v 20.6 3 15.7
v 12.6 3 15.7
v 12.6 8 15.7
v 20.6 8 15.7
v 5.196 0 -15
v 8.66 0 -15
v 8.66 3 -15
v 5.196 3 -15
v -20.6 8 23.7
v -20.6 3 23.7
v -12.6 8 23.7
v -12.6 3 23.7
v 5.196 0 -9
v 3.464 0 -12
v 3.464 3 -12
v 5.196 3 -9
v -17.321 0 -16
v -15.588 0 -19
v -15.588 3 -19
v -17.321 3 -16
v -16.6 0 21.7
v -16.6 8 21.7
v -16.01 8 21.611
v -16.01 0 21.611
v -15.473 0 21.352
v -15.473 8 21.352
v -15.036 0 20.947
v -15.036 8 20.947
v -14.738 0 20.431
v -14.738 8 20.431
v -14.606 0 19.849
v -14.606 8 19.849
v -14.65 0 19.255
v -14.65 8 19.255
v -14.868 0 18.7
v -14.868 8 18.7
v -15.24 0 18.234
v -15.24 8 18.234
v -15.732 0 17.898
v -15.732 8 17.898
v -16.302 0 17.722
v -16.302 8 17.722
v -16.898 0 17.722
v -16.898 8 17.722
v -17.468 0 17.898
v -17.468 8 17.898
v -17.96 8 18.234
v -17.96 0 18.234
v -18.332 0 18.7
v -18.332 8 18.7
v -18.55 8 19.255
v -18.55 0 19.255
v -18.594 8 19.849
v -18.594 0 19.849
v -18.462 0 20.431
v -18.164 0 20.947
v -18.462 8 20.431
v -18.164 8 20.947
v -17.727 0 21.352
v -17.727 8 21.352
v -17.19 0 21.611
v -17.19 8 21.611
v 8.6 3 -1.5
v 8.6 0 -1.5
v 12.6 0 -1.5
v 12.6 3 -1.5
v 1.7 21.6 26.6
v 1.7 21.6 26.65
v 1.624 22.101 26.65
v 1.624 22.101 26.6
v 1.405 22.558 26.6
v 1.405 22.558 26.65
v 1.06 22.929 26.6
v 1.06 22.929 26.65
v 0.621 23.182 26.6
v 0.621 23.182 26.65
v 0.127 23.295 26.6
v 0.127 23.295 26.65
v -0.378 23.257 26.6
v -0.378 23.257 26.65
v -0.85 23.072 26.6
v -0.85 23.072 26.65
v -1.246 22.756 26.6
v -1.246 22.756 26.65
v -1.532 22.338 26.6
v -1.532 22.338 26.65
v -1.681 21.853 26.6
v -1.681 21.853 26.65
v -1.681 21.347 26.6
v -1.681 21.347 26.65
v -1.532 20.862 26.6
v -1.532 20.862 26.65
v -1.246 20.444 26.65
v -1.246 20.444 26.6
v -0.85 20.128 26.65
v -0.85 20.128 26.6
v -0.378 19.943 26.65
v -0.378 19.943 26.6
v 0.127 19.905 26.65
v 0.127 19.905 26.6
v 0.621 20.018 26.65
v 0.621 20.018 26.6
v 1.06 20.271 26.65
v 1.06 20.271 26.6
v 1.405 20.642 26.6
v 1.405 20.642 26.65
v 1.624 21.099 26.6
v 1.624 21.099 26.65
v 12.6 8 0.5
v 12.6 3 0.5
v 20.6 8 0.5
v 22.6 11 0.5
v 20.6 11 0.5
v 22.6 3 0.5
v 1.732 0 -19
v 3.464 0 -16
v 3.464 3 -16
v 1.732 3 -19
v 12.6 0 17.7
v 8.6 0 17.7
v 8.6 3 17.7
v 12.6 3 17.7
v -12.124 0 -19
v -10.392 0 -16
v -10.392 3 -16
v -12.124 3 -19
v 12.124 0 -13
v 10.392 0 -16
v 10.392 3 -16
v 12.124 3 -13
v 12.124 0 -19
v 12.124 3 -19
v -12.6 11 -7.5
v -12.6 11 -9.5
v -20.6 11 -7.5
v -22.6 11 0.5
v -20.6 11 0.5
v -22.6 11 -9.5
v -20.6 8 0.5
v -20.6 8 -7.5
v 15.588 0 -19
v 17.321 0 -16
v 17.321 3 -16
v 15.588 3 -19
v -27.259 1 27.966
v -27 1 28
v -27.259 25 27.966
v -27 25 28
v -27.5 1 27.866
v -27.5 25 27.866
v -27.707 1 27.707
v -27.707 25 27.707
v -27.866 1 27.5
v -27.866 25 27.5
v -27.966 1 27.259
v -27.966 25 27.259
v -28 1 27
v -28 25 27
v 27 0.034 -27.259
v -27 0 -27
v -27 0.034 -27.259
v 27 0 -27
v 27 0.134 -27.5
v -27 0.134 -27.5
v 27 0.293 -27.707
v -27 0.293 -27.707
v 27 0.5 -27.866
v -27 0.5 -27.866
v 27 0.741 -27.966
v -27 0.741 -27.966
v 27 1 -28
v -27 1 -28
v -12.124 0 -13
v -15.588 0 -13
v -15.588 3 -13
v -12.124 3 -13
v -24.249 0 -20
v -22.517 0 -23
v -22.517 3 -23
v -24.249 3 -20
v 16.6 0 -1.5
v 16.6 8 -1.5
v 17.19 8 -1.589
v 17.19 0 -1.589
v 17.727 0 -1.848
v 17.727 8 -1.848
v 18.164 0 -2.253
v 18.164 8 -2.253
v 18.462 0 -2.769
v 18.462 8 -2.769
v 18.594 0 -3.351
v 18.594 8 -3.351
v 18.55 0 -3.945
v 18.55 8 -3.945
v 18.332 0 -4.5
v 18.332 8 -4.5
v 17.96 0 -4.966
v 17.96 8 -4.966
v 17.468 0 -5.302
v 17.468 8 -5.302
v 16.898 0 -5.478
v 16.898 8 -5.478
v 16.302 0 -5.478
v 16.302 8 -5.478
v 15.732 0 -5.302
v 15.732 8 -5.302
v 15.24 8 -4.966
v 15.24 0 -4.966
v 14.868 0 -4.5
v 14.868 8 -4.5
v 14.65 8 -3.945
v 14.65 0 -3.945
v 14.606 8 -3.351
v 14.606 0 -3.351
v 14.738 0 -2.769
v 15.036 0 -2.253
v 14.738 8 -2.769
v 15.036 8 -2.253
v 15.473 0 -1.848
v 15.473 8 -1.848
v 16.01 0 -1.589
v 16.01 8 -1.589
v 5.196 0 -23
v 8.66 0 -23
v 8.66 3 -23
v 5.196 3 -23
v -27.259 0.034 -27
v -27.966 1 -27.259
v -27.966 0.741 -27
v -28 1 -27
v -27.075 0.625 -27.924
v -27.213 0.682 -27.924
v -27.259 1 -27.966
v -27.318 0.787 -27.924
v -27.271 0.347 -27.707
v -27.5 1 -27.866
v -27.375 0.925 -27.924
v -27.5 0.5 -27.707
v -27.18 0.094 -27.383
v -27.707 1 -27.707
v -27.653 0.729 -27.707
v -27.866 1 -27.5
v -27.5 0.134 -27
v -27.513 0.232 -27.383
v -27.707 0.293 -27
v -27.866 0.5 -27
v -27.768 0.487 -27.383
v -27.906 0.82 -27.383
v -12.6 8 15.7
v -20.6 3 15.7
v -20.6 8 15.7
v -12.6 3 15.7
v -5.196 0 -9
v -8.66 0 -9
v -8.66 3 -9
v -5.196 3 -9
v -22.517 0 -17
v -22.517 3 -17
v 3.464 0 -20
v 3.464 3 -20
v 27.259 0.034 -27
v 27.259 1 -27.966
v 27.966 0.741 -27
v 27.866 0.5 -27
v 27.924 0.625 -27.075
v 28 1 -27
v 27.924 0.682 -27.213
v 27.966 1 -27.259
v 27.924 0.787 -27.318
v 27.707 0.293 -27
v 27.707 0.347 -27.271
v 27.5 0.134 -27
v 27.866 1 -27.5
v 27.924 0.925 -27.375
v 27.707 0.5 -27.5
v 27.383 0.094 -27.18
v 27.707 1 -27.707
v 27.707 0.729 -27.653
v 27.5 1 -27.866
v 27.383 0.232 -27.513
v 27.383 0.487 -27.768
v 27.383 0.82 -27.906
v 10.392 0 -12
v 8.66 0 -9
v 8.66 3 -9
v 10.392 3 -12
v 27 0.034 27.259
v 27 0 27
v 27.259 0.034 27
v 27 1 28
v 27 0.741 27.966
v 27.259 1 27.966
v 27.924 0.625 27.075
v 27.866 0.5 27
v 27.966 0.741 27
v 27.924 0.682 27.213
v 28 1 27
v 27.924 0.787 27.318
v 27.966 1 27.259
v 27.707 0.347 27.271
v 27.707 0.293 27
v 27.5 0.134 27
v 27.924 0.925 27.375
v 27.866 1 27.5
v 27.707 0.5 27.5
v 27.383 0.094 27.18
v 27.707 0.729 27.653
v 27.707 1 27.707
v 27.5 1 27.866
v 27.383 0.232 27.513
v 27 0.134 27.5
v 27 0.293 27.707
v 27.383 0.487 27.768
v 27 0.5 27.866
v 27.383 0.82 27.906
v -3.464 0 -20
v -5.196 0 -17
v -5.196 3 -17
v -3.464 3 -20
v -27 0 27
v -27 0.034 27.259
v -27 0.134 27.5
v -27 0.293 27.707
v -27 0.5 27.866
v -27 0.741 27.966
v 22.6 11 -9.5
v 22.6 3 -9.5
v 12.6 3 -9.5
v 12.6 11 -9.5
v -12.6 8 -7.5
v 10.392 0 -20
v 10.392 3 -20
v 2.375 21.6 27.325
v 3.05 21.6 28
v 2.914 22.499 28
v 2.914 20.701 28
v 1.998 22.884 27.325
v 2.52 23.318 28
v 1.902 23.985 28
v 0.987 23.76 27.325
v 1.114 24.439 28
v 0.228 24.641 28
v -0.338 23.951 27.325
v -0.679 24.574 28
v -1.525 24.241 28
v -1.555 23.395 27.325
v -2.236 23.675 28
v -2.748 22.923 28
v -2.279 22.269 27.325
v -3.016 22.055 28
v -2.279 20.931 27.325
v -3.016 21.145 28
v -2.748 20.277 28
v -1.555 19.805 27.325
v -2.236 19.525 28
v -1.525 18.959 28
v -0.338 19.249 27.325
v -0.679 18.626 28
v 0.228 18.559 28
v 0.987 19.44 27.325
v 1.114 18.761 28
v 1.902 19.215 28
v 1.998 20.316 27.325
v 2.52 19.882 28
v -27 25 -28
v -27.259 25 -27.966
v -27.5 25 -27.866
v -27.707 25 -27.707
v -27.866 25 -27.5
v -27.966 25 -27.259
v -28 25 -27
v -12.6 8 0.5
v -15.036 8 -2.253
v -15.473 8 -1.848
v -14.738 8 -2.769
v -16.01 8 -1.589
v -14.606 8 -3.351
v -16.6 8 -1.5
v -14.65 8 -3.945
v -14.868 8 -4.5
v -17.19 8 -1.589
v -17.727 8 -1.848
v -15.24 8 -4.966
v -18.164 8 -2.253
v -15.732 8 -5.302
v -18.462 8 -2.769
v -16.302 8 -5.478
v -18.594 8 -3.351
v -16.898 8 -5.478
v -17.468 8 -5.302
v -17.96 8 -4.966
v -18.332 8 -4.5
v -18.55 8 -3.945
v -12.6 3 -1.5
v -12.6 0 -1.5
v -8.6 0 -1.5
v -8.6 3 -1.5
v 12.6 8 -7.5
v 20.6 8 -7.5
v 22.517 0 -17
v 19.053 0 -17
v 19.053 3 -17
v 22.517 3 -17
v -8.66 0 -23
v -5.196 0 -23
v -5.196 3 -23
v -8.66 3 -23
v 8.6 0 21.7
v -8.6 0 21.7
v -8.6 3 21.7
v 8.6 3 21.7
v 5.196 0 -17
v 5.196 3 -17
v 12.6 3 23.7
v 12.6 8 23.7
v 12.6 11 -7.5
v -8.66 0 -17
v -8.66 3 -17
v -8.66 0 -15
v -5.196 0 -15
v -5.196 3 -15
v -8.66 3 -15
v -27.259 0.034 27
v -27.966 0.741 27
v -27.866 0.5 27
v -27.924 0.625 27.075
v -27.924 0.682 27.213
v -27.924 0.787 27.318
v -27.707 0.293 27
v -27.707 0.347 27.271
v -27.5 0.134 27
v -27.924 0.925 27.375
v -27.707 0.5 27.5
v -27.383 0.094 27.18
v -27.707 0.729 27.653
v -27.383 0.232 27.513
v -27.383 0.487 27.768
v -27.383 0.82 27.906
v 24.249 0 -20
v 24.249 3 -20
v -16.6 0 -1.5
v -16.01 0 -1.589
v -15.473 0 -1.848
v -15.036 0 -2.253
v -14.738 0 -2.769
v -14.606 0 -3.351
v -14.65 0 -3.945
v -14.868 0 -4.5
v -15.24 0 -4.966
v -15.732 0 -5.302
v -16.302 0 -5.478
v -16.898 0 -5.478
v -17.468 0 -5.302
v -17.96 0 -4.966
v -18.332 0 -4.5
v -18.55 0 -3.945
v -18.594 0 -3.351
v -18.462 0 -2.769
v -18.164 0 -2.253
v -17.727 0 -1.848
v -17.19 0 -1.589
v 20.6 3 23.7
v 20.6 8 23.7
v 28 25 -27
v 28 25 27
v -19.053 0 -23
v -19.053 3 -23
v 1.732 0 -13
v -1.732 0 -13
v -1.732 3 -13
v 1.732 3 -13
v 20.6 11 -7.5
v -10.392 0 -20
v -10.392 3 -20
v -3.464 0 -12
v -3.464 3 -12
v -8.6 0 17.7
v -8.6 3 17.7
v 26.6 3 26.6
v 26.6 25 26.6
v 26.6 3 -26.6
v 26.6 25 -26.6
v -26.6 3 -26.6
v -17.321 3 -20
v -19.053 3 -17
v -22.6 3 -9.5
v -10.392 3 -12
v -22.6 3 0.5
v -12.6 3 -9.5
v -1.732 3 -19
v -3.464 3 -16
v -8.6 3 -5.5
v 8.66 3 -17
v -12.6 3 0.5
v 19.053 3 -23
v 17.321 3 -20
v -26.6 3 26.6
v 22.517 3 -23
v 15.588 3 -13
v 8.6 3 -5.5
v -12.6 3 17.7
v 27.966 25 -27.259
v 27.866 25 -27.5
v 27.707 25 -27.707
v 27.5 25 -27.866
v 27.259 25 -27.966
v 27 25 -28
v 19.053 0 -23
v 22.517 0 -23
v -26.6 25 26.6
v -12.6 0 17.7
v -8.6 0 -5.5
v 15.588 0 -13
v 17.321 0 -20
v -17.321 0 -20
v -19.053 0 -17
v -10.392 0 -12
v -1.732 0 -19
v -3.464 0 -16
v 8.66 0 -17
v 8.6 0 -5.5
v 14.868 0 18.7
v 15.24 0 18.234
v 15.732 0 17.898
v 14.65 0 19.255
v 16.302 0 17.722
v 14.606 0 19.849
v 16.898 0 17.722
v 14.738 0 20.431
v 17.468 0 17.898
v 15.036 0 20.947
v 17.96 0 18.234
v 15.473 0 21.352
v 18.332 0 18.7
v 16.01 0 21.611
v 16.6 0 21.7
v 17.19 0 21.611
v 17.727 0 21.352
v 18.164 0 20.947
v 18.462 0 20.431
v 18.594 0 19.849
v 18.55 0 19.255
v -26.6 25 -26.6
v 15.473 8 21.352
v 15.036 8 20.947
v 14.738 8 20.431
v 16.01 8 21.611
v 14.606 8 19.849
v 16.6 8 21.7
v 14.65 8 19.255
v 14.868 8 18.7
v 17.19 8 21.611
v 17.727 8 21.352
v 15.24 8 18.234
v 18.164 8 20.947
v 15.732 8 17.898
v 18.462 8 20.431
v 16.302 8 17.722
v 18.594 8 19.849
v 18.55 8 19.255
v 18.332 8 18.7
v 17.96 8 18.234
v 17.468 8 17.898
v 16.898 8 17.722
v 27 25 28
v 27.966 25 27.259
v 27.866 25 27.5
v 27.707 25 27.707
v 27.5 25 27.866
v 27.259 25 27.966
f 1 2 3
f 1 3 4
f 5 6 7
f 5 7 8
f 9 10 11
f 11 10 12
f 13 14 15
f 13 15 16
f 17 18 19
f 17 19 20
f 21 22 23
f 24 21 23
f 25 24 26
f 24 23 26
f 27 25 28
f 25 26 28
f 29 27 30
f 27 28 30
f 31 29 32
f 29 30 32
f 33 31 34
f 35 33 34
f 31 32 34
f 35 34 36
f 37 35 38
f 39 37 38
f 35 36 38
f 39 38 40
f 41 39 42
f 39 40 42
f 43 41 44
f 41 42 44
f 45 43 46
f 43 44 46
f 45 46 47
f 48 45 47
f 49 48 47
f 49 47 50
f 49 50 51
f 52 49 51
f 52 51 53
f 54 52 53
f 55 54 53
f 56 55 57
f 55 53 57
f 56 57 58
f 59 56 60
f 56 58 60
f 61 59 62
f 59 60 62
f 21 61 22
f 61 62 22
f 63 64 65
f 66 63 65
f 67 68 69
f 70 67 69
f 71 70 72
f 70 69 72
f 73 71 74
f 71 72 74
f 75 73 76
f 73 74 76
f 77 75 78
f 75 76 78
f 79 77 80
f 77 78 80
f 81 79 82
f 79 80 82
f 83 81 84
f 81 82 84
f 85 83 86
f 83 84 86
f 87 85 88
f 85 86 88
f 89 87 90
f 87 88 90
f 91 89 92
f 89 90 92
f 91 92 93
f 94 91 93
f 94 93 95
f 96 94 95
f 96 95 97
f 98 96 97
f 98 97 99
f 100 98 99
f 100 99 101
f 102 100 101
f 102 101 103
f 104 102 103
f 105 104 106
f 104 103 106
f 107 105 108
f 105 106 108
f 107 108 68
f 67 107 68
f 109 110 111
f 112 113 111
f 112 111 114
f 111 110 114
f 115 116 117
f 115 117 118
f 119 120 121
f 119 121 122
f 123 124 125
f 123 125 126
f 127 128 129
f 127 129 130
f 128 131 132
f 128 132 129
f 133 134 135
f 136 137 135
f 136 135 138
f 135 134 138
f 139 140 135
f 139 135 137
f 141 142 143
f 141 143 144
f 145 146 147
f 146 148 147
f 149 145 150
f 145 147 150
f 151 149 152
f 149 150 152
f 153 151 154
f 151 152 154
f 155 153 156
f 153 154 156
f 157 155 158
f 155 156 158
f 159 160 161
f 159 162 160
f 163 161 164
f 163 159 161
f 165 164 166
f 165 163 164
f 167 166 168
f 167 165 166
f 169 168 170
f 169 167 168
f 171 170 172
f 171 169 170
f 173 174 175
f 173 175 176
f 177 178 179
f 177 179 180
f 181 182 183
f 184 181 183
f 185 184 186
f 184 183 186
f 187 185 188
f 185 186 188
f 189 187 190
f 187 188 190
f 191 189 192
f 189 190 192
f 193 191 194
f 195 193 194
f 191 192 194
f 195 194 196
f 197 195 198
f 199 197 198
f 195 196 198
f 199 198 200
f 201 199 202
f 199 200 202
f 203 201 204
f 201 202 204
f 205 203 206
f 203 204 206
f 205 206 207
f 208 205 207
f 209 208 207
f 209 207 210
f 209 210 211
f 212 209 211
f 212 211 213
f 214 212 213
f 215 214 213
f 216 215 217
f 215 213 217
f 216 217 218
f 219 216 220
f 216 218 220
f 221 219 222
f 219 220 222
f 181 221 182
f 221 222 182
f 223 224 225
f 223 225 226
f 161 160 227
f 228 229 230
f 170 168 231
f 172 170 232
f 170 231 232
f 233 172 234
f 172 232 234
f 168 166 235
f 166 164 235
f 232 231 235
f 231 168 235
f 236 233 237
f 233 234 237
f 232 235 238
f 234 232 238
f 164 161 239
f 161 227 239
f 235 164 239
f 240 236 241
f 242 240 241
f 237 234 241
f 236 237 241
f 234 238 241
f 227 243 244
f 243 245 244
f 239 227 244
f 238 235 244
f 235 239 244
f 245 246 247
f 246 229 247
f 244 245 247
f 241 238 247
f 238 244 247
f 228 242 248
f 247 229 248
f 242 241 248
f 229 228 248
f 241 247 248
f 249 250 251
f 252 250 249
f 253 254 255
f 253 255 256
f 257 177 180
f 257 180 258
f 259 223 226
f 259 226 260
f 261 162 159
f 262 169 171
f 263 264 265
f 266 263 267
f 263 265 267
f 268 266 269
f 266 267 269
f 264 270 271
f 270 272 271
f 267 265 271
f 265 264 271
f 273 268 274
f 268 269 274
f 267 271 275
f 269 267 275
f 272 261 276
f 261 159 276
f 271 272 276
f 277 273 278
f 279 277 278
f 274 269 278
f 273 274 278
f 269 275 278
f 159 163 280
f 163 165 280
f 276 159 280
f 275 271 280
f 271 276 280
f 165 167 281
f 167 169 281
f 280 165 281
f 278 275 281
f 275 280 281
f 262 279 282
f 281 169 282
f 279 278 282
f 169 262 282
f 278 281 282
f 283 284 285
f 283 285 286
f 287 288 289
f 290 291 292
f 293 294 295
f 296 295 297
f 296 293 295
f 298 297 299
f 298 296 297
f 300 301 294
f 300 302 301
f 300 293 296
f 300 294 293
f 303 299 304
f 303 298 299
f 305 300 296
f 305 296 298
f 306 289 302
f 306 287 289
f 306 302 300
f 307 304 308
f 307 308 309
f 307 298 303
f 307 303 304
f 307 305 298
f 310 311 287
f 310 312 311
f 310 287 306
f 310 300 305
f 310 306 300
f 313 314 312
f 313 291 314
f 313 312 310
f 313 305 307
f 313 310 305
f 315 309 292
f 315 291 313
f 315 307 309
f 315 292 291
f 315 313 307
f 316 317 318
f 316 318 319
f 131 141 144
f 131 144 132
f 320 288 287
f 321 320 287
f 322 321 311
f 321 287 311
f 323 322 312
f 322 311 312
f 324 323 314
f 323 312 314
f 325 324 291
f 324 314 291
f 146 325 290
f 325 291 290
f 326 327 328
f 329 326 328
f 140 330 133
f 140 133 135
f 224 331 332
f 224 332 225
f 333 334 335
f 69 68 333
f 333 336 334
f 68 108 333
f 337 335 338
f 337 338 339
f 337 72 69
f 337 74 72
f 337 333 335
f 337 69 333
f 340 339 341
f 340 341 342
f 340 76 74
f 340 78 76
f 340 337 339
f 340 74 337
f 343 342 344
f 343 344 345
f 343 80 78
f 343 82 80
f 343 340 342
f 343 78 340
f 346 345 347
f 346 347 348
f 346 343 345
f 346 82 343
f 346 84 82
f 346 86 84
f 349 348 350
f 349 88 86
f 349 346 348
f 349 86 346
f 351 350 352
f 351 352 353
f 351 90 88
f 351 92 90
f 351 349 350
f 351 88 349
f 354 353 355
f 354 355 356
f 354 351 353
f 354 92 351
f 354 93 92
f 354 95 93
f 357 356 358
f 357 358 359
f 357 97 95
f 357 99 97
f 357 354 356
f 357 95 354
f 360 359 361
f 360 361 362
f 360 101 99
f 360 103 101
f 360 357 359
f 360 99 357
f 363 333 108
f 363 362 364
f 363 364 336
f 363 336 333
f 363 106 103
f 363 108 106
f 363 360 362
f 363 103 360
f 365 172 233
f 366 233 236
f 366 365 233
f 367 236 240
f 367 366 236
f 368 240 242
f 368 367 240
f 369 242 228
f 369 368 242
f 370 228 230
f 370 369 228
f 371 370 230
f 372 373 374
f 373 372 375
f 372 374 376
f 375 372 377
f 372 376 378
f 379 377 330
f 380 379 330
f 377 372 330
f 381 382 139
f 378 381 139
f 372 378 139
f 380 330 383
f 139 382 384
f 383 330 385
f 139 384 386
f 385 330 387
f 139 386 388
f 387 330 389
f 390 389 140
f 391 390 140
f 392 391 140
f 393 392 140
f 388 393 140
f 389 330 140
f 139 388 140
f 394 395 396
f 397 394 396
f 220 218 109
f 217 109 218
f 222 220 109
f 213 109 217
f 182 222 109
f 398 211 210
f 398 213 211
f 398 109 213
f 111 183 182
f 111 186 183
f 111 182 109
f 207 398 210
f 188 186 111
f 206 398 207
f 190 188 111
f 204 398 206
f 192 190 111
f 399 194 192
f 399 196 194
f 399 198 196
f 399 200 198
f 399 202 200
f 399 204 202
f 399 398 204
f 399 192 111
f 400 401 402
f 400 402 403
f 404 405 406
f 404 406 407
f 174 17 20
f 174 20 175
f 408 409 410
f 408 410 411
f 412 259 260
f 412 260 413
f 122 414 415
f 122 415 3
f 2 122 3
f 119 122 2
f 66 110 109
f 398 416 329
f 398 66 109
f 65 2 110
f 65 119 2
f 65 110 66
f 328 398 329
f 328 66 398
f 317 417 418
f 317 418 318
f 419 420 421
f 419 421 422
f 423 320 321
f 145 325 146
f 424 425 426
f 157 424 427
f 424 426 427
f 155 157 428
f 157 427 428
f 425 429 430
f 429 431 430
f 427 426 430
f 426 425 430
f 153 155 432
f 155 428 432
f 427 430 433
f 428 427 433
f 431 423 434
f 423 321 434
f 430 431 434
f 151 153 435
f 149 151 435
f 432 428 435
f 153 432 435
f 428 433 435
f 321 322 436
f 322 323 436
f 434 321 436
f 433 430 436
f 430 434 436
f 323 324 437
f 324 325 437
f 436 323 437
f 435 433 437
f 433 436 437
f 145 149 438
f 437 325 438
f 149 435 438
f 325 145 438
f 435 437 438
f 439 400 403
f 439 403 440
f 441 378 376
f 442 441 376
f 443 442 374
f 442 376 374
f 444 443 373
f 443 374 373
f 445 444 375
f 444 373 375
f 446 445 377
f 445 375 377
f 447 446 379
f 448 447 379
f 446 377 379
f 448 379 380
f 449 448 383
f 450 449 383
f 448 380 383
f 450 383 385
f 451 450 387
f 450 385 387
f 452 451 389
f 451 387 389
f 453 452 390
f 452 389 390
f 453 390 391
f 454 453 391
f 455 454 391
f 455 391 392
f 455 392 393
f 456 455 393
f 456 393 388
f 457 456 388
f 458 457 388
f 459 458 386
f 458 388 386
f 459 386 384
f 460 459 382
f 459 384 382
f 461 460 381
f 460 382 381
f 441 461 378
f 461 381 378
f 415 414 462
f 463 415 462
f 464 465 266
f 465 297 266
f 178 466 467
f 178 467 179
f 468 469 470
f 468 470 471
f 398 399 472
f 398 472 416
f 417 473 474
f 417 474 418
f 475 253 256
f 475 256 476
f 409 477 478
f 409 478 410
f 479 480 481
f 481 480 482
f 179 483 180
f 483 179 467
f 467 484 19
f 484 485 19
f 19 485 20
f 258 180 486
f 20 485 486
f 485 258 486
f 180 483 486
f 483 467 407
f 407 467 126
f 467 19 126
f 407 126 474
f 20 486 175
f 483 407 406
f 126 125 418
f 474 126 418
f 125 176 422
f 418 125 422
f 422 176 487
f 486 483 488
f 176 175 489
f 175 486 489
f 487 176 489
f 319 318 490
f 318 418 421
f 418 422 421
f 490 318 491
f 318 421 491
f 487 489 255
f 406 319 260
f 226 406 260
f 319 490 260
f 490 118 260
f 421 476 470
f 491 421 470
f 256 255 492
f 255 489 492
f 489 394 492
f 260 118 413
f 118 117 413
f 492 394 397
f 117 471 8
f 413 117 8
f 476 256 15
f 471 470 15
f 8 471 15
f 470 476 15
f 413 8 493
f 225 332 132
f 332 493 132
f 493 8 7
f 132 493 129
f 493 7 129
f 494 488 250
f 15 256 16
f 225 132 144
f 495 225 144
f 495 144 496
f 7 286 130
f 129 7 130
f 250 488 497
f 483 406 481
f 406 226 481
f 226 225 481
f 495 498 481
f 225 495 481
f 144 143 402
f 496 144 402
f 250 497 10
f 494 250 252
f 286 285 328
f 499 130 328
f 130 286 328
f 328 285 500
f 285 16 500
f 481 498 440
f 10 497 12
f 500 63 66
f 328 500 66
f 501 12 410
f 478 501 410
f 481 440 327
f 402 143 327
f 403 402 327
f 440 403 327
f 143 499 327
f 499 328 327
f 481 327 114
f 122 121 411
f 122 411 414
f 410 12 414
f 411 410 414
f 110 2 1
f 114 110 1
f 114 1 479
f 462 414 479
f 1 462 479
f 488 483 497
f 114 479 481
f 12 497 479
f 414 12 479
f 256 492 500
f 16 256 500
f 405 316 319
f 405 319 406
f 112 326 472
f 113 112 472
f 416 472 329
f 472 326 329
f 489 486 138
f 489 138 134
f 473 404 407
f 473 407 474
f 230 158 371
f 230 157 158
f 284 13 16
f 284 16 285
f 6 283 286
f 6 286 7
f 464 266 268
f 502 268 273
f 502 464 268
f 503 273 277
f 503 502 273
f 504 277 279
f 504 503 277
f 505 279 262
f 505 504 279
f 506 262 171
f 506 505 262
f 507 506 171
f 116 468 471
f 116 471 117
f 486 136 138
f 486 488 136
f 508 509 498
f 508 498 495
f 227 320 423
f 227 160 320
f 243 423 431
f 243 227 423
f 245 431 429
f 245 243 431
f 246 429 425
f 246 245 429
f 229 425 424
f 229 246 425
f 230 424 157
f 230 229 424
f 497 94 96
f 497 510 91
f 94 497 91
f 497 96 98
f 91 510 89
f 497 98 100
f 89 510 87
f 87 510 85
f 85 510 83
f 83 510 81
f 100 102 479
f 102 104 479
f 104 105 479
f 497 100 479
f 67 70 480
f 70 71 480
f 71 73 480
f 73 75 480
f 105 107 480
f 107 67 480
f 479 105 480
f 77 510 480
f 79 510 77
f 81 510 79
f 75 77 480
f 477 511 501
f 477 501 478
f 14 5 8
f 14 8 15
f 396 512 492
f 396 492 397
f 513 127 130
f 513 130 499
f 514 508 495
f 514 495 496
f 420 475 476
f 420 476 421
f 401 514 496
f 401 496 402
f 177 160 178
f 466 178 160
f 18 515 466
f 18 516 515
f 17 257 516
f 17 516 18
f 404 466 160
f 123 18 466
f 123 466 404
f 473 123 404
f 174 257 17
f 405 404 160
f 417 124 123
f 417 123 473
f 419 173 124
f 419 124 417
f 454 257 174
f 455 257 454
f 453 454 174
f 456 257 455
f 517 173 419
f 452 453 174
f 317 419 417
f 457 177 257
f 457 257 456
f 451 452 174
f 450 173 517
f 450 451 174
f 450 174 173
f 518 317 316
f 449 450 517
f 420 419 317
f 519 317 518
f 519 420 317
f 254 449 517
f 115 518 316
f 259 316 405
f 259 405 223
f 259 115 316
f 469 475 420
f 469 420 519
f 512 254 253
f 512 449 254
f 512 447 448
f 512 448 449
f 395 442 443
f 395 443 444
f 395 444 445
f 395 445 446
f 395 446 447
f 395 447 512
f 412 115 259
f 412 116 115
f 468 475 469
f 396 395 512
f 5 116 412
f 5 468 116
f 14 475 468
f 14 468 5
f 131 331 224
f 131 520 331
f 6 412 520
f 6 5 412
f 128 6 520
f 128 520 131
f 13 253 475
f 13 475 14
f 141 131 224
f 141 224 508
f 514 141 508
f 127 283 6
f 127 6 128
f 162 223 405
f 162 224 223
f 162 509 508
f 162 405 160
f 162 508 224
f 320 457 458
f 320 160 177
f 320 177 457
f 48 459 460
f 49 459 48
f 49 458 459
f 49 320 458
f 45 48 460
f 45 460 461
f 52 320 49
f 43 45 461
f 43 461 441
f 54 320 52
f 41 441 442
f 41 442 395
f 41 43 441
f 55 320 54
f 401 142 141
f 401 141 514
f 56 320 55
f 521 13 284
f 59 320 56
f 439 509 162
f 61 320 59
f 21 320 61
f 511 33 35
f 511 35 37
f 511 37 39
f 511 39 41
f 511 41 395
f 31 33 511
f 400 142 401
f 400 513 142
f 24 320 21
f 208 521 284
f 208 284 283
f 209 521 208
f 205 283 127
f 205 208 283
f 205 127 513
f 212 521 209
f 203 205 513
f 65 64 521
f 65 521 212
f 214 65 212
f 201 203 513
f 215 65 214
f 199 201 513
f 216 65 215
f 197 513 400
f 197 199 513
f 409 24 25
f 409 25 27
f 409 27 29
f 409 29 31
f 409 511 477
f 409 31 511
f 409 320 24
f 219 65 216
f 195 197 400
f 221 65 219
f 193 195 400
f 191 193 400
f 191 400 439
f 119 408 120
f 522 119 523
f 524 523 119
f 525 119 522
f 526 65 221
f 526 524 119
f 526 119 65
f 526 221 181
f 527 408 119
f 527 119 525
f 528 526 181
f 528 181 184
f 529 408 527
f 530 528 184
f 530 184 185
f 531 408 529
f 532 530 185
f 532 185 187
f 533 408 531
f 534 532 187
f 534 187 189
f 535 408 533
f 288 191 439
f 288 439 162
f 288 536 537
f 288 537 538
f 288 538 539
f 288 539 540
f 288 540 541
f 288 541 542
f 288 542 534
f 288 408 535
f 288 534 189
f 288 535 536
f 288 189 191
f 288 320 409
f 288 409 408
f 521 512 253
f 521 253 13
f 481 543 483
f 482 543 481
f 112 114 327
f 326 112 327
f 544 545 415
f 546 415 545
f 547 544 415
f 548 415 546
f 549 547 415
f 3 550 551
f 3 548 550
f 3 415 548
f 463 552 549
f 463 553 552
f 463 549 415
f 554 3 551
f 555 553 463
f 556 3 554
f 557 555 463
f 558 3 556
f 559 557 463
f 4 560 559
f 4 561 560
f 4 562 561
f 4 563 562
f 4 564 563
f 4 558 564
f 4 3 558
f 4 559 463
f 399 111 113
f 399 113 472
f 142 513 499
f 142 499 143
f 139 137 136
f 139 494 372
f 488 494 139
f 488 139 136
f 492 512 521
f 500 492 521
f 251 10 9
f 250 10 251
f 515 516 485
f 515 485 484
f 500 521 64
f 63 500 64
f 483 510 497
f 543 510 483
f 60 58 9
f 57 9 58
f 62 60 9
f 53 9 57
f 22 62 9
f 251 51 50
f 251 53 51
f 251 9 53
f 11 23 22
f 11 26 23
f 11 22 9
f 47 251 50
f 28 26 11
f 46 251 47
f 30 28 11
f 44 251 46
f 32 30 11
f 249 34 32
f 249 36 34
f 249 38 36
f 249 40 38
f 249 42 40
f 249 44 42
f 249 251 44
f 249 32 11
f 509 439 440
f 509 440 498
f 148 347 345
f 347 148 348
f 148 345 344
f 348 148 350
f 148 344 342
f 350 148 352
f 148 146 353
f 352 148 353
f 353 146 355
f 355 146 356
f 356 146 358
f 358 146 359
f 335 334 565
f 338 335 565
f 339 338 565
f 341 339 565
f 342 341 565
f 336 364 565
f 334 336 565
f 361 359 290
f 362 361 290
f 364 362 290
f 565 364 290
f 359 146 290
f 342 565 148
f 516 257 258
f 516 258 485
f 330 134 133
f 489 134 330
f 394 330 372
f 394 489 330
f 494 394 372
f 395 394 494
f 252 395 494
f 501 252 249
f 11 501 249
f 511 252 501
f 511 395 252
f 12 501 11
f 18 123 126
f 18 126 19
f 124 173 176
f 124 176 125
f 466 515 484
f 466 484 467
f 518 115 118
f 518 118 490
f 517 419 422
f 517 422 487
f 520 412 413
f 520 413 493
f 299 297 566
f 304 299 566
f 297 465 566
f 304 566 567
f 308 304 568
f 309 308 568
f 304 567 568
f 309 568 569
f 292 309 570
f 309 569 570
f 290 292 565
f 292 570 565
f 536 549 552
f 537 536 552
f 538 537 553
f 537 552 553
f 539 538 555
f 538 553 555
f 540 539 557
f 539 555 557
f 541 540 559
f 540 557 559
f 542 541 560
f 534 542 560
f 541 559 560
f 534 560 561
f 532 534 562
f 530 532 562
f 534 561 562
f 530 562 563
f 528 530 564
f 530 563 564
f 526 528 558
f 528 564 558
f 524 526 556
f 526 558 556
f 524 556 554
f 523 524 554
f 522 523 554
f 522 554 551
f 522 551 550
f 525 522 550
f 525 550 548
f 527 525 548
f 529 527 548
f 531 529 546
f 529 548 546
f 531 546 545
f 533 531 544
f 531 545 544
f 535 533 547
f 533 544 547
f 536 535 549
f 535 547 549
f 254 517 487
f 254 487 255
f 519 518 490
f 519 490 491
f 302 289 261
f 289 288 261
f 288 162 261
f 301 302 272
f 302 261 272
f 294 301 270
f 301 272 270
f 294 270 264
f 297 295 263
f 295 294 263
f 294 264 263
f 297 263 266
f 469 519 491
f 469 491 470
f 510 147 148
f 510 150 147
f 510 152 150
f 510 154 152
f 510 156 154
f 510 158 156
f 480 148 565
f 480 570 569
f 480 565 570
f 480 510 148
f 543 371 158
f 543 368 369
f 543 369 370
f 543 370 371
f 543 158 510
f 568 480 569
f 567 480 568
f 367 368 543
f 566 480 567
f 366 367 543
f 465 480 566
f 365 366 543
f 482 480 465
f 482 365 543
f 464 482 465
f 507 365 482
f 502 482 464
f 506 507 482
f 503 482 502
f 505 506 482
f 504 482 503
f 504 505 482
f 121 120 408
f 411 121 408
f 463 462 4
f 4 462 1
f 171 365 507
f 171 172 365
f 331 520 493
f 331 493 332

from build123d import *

# Parameters (mm, degrees)
SKETCH1_W           = 56
SKETCH1_H           = 56
BOSS_EXTRUDE1_DEPTH = 25
SKETCH2_W           = 53.2
SKETCH2_H           = 53.2
CUT_EXTRUDE1_DEPTH  = 22
SKETCH3_R           = 1.7
CUT_EXTRUDE2_DEPTH  = 1.4
SKETCH4_W           = 25.2
SKETCH4_H           = 27.2
CUT_EXTRUDE3_DEPTH  = 3
SKETCH5_W           = 4
SKETCH5_H           = 4
BOSS_EXTRUDE2_DEPTH = 3
SKETCH6_W           = 8
SKETCH6_H           = 8
BOSS_EXTRUDE3_DEPTH = 5
SKETCH7_R           = 2
CUT_EXTRUDE4_DEPTH  = 8
BOSS_EXTRUDE4_DEPTH = 3
FILLET1_R           = 1
CHAMFER1_SIZE       = 1.35
FILL_PATTERN1_DEPTH = 3


# Read off the part's stored shape, not the designer's step: Fill Pattern1
with BuildPart() as part:
    # Sketch1 → Boss-Extrude1 (new body)
    with BuildSketch(Plane(origin=(0, 0, 0), x_dir=(1, 0, 0), z_dir=(0, 1, 0))):
        Rectangle(SKETCH1_W, SKETCH1_H)
    extrude(amount=BOSS_EXTRUDE1_DEPTH)

    # Sketch2 → Cut-Extrude1 (cut)
    with BuildSketch(Plane(origin=(0, 25, 0), x_dir=(1, 0, 0), z_dir=(0, 1, 0))):
        Rectangle(SKETCH2_W, SKETCH2_H)
    extrude(amount=-CUT_EXTRUDE1_DEPTH, mode=Mode.SUBTRACT)

    # Sketch3 → Cut-Extrude2 (cut)
    with BuildSketch(Plane.XY.offset(28)):
        with Locations((0, 21.6)):
            Circle(SKETCH3_R)
    extrude(amount=-CUT_EXTRUDE2_DEPTH, mode=Mode.SUBTRACT)

    # Sketch4 → Cut-Extrude3 (cut)
    with BuildSketch(Plane.XZ):
        with Locations((0, 8.1)):
            Rectangle(SKETCH4_W, SKETCH4_H)
    extrude(amount=-CUT_EXTRUDE3_DEPTH, mode=Mode.SUBTRACT)

    # Sketch5 → Boss-Extrude2 (add)
    with BuildSketch(Plane.XZ):
        with Locations((-10.6, 19.7)):
            Rectangle(SKETCH5_W, SKETCH5_H)
        with Locations((10.6, 19.7)):
            Rectangle(SKETCH5_W, SKETCH5_H)
        with Locations((10.6, -3.5)):
            Rectangle(SKETCH5_W, SKETCH5_H)
        with Locations((-10.6, -3.5)):
            Rectangle(SKETCH5_W, SKETCH5_H)
    extrude(amount=-BOSS_EXTRUDE2_DEPTH)

    # Sketch6 → Boss-Extrude3 (add)
    with BuildSketch(Plane(origin=(0, 3, 0), x_dir=(1, 0, 0), z_dir=(0, 1, 0))):
        with Locations((16.6, -19.7)):
            Rectangle(SKETCH6_W, SKETCH6_H)
        with Locations((-16.6, -19.7)):
            Rectangle(SKETCH6_W, SKETCH6_H)
        Polygon((12.6, -0.5), (20.6, -0.5), (22.6, -0.5), (22.6, 9.5), (12.6, 9.5), (12.6, 7.5), align=None)
        Polygon((-12.6, -0.5), (-20.6, -0.5), (-22.6, -0.5), (-22.6, 9.5), (-12.6, 9.5), (-12.6, 7.5), align=None)
    extrude(amount=BOSS_EXTRUDE3_DEPTH)

    # Sketch7 → Cut-Extrude4 (cut)
    with BuildSketch(Plane(origin=(0, 8, 0), x_dir=(1, 0, 0), z_dir=(0, 1, 0))):
        with Locations(Location((16.6, -19.7, 0), (0, 0, 270))):
            Circle(SKETCH7_R)
        with Locations(Location((-16.6, -19.7, 0), (0, 0, 270))):
            Circle(SKETCH7_R)
        with Locations(Location((16.6, 3.5, 0), (0, 0, 270))):
            Circle(SKETCH7_R)
        with Locations(Location((-16.6, 3.5, 0), (0, 0, 270))):
            Circle(SKETCH7_R)
    extrude(amount=-CUT_EXTRUDE4_DEPTH, mode=Mode.SUBTRACT)

    # Sketch9 → Boss-Extrude4 (add)
    with BuildSketch(Plane(origin=(0, 8, 0), x_dir=(1, 0, 0), z_dir=(0, 1, 0))):
        Polygon((-22.6, -0.5), (-22.6, 9.5), (-12.6, 9.5), (-12.6, 7.5), (-20.6, 7.5), (-20.6, -0.5), align=None)
        Polygon((12.6, 9.5), (22.6, 9.5), (22.6, -0.5), (20.6, -0.5), (20.6, 7.5), (12.6, 7.5), align=None)
    extrude(amount=BOSS_EXTRUDE4_DEPTH)

    # Fillet1
    fillet1_edges = [part.edges().sort_by_distance(p)[0] for p in [
        (0, 0, 28),
        (-28, 0, 0),
        (0, 0, -28),
        (28, 0, 0),
        (28, 12.5, 28),
        (-28, 12.5, 28),
        (-28, 12.5, -28),
        (28, 12.5, -28),
    ]]
    fillet(fillet1_edges, radius=FILLET1_R)

    # Chamfer1
    chamfer1_edges = [part.edges().sort_by_distance(p)[0] for p in [
        (-1.7, 21.6, 28),
    ]]
    chamfer(chamfer1_edges, length=CHAMFER1_SIZE)

    # Fill Pattern1 outline → Fill Pattern1 (cut)
    with BuildSketch(Plane(origin=(0, 0, 0), x_dir=(1, 0, 0), z_dir=(0, 1, 0))):
        Polygon((22.516660498, 17), (24.248711306, 20), (22.516660498, 23), (19.052558883, 23), (17.320508076, 20), (19.052558883, 17), align=None)
        Polygon((8.660254038, 23), (5.196152423, 23), (3.464101615, 20), (5.196152423, 17), (8.660254038, 17), (10.392304845, 20), align=None)
        Polygon((-5.196152423, 23), (-8.660254038, 23), (-10.392304845, 20), (-8.660254038, 17), (-5.196152423, 17), (-3.464101615, 20), align=None)
        Polygon((-19.052558883, 23), (-22.516660498, 23), (-24.248711306, 20), (-22.516660498, 17), (-19.052558883, 17), (-17.320508076, 20), align=None)
        Polygon((1.732050808, 13), (3.464101615, 16), (1.732050808, 19), (-1.732050808, 19), (-3.464101615, 16), (-1.732050808, 13), align=None)
        Polygon((-12.124355653, 19), (-15.588457268, 19), (-17.320508076, 16), (-15.588457268, 13), (-12.124355653, 13), (-10.392304845, 16), align=None)
        Polygon((15.588457268, 19), (12.124355653, 19), (10.392304845, 16), (12.124355653, 13), (15.588457268, 13), (17.320508076, 16), align=None)
        Polygon((8.660254038, 9), (10.392304845, 12), (8.660254038, 15), (5.196152423, 15), (3.464101615, 12), (5.196152423, 9), align=None)
        Polygon((-5.196152423, 15), (-8.660254038, 15), (-10.392304845, 12), (-8.660254038, 9), (-5.196152423, 9), (-3.464101615, 12), align=None)
    extrude(amount=FILL_PATTERN1_DEPTH, mode=Mode.SUBTRACT)


solid = part.part
